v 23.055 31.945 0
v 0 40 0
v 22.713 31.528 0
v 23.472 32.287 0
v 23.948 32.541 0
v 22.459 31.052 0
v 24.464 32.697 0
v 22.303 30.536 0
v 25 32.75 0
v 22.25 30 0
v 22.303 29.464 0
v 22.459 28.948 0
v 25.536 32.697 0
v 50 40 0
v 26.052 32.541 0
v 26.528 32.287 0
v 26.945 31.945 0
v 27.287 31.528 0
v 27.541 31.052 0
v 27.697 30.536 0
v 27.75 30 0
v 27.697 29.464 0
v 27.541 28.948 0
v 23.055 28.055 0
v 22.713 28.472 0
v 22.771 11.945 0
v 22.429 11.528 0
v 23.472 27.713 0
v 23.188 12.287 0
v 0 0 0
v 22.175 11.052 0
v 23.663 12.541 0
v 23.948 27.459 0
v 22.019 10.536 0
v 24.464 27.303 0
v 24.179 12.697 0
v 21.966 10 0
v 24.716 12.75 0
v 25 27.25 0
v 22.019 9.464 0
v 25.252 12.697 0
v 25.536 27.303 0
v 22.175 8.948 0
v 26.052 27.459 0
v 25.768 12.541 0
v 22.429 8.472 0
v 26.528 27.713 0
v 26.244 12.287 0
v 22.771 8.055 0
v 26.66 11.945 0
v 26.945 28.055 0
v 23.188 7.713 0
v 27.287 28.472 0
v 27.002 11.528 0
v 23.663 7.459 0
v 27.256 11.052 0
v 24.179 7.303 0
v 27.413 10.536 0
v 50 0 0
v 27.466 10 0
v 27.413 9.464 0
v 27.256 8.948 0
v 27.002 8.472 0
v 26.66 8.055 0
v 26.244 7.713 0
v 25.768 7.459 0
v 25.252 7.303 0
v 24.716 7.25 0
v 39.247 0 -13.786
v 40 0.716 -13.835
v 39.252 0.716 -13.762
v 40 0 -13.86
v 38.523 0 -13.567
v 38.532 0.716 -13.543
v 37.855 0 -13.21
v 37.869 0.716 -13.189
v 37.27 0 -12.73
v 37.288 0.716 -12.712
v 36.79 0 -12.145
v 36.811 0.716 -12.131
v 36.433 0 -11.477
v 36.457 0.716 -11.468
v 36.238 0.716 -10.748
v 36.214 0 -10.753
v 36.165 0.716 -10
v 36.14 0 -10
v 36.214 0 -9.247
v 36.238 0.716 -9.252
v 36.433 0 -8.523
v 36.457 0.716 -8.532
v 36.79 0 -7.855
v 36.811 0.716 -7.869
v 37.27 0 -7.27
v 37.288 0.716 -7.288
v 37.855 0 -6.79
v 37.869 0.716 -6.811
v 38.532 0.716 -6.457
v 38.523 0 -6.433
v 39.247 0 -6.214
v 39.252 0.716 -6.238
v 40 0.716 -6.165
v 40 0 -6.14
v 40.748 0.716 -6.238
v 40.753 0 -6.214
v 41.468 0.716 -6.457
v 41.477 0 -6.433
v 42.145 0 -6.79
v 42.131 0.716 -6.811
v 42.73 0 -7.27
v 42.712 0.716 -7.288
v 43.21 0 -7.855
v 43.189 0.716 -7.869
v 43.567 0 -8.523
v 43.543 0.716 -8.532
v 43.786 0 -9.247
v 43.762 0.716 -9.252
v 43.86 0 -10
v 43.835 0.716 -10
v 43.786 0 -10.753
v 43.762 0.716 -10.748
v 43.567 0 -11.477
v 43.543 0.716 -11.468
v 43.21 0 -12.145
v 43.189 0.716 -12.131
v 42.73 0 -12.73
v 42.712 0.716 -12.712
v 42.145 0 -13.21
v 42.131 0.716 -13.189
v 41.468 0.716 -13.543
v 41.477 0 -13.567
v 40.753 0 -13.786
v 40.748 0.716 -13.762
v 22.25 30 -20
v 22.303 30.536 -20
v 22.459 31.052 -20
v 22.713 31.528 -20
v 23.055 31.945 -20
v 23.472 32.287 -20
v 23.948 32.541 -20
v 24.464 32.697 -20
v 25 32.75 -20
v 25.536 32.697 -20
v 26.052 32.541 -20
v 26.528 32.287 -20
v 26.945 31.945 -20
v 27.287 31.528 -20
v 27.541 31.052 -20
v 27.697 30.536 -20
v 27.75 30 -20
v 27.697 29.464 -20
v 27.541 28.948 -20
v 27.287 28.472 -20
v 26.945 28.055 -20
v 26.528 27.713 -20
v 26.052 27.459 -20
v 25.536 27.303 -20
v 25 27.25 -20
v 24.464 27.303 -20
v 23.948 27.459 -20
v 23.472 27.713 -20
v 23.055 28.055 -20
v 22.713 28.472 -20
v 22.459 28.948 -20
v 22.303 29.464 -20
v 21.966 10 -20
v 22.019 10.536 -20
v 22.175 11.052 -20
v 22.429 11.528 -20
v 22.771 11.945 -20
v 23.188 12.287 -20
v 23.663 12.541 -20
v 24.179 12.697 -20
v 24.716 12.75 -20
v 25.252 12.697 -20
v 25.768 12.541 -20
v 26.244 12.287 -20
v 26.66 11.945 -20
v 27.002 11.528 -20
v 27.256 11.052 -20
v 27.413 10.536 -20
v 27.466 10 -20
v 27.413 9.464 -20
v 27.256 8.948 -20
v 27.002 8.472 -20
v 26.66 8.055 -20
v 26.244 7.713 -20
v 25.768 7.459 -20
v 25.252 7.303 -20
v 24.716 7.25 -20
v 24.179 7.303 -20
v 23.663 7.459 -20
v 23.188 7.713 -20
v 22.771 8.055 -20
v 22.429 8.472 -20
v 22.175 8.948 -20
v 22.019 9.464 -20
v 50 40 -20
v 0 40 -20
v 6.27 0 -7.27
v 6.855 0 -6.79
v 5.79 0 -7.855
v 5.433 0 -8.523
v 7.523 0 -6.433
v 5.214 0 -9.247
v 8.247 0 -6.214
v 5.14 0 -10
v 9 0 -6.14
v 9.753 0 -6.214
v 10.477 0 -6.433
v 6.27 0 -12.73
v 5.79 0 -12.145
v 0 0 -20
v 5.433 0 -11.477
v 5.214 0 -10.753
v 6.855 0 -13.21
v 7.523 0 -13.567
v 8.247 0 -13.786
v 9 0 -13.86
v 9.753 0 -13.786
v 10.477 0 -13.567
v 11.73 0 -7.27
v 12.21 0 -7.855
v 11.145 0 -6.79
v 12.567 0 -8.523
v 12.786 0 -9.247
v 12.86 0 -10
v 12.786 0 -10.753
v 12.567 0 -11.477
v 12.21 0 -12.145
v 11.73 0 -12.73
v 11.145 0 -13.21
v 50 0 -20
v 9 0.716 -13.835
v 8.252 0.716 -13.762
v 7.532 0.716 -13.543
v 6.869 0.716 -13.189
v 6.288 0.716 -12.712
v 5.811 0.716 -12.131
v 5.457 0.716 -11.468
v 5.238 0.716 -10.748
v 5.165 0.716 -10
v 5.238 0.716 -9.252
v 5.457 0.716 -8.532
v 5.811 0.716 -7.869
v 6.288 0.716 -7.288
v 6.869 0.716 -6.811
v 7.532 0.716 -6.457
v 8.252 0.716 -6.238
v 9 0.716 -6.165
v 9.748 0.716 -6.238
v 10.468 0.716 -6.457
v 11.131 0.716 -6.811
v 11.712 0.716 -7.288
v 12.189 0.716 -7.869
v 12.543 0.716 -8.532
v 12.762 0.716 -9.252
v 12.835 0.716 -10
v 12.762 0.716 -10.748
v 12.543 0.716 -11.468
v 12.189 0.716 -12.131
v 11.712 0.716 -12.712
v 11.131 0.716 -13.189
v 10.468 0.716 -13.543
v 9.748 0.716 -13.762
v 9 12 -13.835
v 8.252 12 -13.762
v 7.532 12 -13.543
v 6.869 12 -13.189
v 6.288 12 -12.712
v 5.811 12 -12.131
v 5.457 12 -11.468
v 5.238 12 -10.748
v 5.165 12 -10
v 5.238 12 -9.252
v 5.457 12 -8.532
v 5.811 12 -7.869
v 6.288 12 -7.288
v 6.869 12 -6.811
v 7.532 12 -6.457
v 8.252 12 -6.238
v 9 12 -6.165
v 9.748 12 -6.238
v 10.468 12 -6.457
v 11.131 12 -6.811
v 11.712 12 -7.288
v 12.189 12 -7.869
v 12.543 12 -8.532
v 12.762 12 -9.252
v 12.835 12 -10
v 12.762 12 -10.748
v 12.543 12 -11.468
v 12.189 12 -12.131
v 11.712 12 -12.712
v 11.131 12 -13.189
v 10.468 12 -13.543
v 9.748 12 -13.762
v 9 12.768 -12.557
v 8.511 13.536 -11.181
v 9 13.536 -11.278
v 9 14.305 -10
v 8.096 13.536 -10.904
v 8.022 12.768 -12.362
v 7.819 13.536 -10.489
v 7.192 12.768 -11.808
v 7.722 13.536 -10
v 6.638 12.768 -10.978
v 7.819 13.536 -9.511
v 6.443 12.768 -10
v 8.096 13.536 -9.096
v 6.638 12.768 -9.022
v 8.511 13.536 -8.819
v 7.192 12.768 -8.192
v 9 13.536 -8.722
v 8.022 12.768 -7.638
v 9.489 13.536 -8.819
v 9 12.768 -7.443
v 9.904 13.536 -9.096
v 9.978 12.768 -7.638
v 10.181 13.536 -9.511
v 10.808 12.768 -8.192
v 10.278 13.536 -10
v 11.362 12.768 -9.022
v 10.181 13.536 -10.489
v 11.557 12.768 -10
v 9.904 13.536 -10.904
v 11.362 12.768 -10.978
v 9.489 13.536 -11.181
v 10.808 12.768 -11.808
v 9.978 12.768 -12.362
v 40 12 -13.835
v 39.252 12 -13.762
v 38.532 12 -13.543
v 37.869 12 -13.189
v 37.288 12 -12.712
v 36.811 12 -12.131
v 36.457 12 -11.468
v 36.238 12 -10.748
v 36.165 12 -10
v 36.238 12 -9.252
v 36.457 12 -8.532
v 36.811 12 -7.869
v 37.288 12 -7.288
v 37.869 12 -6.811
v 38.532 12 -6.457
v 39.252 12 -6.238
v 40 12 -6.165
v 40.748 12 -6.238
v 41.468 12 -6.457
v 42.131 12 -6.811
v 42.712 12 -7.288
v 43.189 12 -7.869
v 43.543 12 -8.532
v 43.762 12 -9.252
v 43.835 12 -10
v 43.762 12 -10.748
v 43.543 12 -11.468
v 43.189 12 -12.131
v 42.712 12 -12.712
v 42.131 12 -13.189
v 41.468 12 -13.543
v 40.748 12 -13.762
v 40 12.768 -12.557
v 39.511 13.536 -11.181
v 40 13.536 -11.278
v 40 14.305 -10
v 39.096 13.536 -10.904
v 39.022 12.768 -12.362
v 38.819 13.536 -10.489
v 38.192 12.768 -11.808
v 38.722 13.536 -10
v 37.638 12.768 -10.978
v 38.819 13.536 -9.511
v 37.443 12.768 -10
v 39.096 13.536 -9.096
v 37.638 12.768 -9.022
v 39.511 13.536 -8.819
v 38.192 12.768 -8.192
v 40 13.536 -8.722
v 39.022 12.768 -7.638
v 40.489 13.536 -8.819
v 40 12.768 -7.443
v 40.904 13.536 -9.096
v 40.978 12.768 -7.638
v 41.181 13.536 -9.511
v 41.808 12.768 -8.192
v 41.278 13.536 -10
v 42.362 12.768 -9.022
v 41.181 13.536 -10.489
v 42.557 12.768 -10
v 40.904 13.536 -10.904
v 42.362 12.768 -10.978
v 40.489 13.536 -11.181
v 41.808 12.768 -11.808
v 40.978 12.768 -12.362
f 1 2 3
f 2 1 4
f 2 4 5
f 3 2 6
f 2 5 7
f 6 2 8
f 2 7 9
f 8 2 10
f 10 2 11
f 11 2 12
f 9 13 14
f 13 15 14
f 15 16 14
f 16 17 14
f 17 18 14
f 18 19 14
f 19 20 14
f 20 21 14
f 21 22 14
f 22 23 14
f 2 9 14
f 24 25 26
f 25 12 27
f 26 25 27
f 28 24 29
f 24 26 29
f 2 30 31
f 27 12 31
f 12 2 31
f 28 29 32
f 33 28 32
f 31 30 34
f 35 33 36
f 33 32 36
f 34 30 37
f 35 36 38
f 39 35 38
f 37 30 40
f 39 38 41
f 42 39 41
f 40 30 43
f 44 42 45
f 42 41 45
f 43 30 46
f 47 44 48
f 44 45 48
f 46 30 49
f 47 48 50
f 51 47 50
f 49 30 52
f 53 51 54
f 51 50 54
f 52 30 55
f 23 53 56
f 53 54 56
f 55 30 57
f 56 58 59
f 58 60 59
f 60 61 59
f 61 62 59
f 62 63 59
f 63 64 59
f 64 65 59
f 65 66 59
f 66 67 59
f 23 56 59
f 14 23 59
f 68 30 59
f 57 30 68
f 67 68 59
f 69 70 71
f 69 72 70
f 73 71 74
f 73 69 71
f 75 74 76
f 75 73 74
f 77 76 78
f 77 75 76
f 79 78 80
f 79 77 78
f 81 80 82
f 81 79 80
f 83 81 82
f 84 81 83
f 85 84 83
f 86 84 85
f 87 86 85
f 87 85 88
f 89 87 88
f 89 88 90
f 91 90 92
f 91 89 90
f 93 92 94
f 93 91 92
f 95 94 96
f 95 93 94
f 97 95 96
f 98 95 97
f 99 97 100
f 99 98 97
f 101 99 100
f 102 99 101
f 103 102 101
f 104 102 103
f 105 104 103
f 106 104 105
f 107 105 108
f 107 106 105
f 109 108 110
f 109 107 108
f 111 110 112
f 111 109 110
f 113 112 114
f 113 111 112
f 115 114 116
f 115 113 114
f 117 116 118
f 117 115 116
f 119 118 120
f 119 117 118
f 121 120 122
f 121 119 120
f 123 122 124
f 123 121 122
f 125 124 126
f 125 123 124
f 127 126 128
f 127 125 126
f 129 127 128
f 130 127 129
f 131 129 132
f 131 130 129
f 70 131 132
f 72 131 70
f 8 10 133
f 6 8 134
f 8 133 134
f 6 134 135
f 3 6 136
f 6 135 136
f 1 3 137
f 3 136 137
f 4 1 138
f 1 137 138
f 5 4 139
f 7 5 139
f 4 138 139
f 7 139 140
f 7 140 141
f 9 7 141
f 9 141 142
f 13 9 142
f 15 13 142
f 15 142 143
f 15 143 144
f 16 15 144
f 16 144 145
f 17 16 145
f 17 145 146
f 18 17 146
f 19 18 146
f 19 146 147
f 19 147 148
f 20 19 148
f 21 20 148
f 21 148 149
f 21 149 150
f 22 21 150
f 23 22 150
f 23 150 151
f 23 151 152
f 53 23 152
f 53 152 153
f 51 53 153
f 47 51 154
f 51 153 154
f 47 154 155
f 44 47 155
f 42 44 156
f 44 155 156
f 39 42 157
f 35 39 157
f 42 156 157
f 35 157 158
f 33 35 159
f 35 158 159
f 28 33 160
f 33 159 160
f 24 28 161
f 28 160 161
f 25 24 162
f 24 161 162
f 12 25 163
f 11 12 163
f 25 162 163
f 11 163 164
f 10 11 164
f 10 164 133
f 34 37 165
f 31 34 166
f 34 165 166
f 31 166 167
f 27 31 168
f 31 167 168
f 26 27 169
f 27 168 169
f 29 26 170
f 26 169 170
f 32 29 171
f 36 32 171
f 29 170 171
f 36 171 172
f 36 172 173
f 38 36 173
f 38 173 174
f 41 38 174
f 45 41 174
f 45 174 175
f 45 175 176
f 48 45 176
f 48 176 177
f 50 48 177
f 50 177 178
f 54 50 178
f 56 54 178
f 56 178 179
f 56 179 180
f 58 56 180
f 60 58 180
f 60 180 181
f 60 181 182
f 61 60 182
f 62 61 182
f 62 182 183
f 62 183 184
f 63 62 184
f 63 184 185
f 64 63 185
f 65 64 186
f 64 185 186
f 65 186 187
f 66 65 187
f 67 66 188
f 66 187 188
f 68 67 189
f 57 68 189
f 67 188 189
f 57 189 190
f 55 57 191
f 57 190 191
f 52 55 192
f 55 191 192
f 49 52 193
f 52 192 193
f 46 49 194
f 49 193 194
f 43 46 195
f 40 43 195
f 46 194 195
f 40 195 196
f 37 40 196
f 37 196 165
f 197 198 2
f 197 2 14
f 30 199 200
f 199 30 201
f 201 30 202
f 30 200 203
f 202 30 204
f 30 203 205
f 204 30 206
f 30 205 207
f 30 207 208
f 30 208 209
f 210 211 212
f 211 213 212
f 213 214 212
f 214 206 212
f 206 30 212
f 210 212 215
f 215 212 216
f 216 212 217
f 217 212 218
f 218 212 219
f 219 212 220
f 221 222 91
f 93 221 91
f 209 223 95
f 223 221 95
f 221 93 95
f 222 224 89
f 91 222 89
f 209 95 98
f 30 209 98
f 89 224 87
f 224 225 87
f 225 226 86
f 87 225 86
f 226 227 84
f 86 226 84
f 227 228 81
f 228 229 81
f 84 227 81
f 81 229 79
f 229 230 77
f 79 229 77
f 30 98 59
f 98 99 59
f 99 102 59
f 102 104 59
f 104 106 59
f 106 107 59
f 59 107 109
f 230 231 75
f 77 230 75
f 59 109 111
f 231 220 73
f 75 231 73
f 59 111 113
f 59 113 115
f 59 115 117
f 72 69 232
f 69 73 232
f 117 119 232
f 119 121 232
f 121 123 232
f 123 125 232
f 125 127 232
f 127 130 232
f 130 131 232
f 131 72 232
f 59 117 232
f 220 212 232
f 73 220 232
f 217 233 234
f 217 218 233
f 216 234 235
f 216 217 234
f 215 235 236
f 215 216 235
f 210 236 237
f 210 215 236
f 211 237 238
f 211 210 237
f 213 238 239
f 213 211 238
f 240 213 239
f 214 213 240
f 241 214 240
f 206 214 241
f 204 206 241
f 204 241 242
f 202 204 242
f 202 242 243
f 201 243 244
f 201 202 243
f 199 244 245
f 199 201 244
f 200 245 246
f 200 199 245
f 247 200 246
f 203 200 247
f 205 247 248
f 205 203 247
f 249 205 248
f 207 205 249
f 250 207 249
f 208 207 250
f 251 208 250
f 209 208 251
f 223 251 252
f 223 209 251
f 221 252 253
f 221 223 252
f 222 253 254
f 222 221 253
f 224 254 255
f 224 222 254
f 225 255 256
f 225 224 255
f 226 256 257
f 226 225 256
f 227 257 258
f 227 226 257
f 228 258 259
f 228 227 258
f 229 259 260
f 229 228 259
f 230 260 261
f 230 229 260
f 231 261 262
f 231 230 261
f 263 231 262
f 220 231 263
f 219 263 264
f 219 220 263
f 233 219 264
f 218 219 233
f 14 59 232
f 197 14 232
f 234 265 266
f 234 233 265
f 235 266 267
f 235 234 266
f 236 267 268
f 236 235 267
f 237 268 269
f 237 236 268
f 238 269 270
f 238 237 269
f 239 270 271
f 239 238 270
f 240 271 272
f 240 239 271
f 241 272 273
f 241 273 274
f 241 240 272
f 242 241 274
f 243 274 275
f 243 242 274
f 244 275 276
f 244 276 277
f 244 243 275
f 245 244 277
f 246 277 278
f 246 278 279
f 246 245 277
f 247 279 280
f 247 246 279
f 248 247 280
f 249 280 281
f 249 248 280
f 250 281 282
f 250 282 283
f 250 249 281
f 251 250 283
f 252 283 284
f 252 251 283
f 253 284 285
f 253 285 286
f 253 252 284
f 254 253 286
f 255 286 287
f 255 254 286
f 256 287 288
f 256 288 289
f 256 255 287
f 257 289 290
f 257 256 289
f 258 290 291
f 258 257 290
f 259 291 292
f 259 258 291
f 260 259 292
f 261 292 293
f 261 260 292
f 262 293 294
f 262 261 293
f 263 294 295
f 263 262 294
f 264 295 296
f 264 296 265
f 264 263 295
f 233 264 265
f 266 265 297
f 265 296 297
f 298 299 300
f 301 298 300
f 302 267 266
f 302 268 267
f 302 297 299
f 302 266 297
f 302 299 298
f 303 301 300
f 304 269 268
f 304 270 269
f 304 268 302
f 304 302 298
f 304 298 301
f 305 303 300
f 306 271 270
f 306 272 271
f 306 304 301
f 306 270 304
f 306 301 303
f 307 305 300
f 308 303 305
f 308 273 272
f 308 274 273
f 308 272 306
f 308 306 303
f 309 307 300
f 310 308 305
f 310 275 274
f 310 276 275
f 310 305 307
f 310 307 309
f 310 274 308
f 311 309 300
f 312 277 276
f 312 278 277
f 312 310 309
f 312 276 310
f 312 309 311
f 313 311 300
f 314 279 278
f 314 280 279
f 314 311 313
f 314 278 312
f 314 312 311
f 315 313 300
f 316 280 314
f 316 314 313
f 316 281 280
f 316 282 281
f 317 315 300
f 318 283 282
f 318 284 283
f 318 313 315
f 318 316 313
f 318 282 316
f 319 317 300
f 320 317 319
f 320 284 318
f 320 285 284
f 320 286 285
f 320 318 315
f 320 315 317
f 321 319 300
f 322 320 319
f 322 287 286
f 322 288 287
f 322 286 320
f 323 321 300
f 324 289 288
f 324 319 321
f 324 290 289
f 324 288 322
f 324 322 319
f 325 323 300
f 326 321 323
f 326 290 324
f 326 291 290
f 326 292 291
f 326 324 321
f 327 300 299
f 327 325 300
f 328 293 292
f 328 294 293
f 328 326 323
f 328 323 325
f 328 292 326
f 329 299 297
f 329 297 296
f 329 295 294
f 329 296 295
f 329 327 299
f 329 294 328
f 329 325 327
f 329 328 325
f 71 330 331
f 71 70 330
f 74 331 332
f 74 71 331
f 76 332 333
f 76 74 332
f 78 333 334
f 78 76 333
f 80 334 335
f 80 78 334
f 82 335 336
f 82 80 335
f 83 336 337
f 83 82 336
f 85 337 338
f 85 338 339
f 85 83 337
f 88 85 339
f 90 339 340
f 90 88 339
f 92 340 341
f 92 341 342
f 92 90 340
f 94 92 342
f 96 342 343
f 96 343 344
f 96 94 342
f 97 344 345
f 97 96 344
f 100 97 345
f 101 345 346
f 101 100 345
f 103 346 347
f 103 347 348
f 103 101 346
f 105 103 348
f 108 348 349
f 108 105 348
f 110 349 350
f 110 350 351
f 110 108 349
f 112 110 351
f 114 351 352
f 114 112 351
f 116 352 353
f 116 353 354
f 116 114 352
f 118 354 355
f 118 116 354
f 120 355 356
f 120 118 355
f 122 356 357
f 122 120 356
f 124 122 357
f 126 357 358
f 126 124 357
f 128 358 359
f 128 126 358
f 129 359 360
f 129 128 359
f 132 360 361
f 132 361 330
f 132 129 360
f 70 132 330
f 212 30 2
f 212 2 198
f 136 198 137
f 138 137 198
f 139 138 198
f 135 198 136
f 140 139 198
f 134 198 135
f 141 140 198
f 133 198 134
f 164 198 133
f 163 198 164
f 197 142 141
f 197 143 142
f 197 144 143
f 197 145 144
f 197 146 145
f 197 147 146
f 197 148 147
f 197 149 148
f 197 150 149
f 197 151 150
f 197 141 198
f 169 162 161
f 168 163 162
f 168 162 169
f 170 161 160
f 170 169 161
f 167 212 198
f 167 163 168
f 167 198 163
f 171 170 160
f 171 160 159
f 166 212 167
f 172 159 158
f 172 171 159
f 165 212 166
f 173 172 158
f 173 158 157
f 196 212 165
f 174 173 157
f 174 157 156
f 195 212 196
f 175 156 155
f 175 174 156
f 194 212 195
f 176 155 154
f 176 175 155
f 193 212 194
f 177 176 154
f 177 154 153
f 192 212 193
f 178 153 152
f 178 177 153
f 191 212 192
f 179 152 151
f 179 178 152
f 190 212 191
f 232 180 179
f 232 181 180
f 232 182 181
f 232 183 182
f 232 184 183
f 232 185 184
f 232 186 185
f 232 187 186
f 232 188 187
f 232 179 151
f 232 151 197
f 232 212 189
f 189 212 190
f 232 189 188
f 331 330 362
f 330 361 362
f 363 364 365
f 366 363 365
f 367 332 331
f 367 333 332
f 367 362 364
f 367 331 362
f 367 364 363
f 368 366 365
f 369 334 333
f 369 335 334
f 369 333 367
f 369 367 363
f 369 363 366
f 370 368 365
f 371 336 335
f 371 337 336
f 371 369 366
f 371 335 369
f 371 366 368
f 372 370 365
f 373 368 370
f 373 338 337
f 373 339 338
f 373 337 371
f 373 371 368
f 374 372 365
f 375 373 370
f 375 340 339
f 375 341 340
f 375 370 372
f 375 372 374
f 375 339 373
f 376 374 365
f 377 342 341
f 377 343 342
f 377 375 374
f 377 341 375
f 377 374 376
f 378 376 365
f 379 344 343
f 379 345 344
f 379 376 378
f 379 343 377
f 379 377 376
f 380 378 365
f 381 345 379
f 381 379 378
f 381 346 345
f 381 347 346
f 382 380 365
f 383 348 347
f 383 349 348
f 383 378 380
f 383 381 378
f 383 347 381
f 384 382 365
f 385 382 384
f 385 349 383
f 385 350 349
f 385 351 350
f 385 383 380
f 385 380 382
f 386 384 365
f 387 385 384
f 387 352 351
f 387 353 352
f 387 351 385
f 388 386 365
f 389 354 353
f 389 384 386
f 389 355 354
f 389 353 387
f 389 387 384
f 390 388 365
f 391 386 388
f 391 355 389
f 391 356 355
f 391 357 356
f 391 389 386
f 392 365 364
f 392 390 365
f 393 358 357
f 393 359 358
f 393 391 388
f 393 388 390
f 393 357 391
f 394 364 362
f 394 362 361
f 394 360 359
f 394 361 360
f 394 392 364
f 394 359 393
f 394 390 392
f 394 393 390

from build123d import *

# Parameters (mm, degrees)
SKETCH1_W                             = 50
SKETCH1_H                             = 20
BOSS_EXTRUDE1_DEPTH                   = 40
M5_CLEARANCE_HOLE1_D                  = 5.5
F_97_0_0059_DIAMETER_HOLE1_AT_2_COUNT = 2
F_97_0_0059_DIAMETER_HOLE1_AT_2_PITCH = 31


with BuildPart() as part:
    # Sketch1 → Boss-Extrude1 (new body)
    with BuildSketch(Plane(origin=(0, 0, 0), x_dir=(1, 0, 0), z_dir=(0, 1, 0))):
        with Locations((25, 10)):
            Rectangle(SKETCH1_W, SKETCH1_H)
    extrude(amount=BOSS_EXTRUDE1_DEPTH)

    # M5 Clearance Hole1 (through all)
    with Locations(Plane.XY):
        with Locations((25, 30), (24.715809074, 10)):
            Hole(M5_CLEARANCE_HOLE1_D / 2)

    # Sketch6 → #97 (0.0059) Diameter Hole1 (revolve, cut)
    with BuildSketch(Plane(origin=(40, 0, -10), x_dir=(0, 0, -1), z_dir=(1, 0, 0))):
        Polygon((0, 0), (0, 14.304540818), (3.8354, 12), (3.8354, 0.71572306), (3.8603936, 0), align=None)
    f_97_0_0059_diameter_hole1 = revolve(axis=Axis((40, -6.35, -10), (0, 1, 0)), mode=Mode.SUBTRACT)

    # #97 (0.0059) Diameter Hole1 at 2: #97 (0.0059) Diameter Hole1 ×2
    with Locations(*[(-i * F_97_0_0059_DIAMETER_HOLE1_AT_2_PITCH, 0, 0) for i in range(1, F_97_0_0059_DIAMETER_HOLE1_AT_2_COUNT)]):
        add(f_97_0_0059_diameter_hole1, mode=Mode.SUBTRACT)


solid = part.part
